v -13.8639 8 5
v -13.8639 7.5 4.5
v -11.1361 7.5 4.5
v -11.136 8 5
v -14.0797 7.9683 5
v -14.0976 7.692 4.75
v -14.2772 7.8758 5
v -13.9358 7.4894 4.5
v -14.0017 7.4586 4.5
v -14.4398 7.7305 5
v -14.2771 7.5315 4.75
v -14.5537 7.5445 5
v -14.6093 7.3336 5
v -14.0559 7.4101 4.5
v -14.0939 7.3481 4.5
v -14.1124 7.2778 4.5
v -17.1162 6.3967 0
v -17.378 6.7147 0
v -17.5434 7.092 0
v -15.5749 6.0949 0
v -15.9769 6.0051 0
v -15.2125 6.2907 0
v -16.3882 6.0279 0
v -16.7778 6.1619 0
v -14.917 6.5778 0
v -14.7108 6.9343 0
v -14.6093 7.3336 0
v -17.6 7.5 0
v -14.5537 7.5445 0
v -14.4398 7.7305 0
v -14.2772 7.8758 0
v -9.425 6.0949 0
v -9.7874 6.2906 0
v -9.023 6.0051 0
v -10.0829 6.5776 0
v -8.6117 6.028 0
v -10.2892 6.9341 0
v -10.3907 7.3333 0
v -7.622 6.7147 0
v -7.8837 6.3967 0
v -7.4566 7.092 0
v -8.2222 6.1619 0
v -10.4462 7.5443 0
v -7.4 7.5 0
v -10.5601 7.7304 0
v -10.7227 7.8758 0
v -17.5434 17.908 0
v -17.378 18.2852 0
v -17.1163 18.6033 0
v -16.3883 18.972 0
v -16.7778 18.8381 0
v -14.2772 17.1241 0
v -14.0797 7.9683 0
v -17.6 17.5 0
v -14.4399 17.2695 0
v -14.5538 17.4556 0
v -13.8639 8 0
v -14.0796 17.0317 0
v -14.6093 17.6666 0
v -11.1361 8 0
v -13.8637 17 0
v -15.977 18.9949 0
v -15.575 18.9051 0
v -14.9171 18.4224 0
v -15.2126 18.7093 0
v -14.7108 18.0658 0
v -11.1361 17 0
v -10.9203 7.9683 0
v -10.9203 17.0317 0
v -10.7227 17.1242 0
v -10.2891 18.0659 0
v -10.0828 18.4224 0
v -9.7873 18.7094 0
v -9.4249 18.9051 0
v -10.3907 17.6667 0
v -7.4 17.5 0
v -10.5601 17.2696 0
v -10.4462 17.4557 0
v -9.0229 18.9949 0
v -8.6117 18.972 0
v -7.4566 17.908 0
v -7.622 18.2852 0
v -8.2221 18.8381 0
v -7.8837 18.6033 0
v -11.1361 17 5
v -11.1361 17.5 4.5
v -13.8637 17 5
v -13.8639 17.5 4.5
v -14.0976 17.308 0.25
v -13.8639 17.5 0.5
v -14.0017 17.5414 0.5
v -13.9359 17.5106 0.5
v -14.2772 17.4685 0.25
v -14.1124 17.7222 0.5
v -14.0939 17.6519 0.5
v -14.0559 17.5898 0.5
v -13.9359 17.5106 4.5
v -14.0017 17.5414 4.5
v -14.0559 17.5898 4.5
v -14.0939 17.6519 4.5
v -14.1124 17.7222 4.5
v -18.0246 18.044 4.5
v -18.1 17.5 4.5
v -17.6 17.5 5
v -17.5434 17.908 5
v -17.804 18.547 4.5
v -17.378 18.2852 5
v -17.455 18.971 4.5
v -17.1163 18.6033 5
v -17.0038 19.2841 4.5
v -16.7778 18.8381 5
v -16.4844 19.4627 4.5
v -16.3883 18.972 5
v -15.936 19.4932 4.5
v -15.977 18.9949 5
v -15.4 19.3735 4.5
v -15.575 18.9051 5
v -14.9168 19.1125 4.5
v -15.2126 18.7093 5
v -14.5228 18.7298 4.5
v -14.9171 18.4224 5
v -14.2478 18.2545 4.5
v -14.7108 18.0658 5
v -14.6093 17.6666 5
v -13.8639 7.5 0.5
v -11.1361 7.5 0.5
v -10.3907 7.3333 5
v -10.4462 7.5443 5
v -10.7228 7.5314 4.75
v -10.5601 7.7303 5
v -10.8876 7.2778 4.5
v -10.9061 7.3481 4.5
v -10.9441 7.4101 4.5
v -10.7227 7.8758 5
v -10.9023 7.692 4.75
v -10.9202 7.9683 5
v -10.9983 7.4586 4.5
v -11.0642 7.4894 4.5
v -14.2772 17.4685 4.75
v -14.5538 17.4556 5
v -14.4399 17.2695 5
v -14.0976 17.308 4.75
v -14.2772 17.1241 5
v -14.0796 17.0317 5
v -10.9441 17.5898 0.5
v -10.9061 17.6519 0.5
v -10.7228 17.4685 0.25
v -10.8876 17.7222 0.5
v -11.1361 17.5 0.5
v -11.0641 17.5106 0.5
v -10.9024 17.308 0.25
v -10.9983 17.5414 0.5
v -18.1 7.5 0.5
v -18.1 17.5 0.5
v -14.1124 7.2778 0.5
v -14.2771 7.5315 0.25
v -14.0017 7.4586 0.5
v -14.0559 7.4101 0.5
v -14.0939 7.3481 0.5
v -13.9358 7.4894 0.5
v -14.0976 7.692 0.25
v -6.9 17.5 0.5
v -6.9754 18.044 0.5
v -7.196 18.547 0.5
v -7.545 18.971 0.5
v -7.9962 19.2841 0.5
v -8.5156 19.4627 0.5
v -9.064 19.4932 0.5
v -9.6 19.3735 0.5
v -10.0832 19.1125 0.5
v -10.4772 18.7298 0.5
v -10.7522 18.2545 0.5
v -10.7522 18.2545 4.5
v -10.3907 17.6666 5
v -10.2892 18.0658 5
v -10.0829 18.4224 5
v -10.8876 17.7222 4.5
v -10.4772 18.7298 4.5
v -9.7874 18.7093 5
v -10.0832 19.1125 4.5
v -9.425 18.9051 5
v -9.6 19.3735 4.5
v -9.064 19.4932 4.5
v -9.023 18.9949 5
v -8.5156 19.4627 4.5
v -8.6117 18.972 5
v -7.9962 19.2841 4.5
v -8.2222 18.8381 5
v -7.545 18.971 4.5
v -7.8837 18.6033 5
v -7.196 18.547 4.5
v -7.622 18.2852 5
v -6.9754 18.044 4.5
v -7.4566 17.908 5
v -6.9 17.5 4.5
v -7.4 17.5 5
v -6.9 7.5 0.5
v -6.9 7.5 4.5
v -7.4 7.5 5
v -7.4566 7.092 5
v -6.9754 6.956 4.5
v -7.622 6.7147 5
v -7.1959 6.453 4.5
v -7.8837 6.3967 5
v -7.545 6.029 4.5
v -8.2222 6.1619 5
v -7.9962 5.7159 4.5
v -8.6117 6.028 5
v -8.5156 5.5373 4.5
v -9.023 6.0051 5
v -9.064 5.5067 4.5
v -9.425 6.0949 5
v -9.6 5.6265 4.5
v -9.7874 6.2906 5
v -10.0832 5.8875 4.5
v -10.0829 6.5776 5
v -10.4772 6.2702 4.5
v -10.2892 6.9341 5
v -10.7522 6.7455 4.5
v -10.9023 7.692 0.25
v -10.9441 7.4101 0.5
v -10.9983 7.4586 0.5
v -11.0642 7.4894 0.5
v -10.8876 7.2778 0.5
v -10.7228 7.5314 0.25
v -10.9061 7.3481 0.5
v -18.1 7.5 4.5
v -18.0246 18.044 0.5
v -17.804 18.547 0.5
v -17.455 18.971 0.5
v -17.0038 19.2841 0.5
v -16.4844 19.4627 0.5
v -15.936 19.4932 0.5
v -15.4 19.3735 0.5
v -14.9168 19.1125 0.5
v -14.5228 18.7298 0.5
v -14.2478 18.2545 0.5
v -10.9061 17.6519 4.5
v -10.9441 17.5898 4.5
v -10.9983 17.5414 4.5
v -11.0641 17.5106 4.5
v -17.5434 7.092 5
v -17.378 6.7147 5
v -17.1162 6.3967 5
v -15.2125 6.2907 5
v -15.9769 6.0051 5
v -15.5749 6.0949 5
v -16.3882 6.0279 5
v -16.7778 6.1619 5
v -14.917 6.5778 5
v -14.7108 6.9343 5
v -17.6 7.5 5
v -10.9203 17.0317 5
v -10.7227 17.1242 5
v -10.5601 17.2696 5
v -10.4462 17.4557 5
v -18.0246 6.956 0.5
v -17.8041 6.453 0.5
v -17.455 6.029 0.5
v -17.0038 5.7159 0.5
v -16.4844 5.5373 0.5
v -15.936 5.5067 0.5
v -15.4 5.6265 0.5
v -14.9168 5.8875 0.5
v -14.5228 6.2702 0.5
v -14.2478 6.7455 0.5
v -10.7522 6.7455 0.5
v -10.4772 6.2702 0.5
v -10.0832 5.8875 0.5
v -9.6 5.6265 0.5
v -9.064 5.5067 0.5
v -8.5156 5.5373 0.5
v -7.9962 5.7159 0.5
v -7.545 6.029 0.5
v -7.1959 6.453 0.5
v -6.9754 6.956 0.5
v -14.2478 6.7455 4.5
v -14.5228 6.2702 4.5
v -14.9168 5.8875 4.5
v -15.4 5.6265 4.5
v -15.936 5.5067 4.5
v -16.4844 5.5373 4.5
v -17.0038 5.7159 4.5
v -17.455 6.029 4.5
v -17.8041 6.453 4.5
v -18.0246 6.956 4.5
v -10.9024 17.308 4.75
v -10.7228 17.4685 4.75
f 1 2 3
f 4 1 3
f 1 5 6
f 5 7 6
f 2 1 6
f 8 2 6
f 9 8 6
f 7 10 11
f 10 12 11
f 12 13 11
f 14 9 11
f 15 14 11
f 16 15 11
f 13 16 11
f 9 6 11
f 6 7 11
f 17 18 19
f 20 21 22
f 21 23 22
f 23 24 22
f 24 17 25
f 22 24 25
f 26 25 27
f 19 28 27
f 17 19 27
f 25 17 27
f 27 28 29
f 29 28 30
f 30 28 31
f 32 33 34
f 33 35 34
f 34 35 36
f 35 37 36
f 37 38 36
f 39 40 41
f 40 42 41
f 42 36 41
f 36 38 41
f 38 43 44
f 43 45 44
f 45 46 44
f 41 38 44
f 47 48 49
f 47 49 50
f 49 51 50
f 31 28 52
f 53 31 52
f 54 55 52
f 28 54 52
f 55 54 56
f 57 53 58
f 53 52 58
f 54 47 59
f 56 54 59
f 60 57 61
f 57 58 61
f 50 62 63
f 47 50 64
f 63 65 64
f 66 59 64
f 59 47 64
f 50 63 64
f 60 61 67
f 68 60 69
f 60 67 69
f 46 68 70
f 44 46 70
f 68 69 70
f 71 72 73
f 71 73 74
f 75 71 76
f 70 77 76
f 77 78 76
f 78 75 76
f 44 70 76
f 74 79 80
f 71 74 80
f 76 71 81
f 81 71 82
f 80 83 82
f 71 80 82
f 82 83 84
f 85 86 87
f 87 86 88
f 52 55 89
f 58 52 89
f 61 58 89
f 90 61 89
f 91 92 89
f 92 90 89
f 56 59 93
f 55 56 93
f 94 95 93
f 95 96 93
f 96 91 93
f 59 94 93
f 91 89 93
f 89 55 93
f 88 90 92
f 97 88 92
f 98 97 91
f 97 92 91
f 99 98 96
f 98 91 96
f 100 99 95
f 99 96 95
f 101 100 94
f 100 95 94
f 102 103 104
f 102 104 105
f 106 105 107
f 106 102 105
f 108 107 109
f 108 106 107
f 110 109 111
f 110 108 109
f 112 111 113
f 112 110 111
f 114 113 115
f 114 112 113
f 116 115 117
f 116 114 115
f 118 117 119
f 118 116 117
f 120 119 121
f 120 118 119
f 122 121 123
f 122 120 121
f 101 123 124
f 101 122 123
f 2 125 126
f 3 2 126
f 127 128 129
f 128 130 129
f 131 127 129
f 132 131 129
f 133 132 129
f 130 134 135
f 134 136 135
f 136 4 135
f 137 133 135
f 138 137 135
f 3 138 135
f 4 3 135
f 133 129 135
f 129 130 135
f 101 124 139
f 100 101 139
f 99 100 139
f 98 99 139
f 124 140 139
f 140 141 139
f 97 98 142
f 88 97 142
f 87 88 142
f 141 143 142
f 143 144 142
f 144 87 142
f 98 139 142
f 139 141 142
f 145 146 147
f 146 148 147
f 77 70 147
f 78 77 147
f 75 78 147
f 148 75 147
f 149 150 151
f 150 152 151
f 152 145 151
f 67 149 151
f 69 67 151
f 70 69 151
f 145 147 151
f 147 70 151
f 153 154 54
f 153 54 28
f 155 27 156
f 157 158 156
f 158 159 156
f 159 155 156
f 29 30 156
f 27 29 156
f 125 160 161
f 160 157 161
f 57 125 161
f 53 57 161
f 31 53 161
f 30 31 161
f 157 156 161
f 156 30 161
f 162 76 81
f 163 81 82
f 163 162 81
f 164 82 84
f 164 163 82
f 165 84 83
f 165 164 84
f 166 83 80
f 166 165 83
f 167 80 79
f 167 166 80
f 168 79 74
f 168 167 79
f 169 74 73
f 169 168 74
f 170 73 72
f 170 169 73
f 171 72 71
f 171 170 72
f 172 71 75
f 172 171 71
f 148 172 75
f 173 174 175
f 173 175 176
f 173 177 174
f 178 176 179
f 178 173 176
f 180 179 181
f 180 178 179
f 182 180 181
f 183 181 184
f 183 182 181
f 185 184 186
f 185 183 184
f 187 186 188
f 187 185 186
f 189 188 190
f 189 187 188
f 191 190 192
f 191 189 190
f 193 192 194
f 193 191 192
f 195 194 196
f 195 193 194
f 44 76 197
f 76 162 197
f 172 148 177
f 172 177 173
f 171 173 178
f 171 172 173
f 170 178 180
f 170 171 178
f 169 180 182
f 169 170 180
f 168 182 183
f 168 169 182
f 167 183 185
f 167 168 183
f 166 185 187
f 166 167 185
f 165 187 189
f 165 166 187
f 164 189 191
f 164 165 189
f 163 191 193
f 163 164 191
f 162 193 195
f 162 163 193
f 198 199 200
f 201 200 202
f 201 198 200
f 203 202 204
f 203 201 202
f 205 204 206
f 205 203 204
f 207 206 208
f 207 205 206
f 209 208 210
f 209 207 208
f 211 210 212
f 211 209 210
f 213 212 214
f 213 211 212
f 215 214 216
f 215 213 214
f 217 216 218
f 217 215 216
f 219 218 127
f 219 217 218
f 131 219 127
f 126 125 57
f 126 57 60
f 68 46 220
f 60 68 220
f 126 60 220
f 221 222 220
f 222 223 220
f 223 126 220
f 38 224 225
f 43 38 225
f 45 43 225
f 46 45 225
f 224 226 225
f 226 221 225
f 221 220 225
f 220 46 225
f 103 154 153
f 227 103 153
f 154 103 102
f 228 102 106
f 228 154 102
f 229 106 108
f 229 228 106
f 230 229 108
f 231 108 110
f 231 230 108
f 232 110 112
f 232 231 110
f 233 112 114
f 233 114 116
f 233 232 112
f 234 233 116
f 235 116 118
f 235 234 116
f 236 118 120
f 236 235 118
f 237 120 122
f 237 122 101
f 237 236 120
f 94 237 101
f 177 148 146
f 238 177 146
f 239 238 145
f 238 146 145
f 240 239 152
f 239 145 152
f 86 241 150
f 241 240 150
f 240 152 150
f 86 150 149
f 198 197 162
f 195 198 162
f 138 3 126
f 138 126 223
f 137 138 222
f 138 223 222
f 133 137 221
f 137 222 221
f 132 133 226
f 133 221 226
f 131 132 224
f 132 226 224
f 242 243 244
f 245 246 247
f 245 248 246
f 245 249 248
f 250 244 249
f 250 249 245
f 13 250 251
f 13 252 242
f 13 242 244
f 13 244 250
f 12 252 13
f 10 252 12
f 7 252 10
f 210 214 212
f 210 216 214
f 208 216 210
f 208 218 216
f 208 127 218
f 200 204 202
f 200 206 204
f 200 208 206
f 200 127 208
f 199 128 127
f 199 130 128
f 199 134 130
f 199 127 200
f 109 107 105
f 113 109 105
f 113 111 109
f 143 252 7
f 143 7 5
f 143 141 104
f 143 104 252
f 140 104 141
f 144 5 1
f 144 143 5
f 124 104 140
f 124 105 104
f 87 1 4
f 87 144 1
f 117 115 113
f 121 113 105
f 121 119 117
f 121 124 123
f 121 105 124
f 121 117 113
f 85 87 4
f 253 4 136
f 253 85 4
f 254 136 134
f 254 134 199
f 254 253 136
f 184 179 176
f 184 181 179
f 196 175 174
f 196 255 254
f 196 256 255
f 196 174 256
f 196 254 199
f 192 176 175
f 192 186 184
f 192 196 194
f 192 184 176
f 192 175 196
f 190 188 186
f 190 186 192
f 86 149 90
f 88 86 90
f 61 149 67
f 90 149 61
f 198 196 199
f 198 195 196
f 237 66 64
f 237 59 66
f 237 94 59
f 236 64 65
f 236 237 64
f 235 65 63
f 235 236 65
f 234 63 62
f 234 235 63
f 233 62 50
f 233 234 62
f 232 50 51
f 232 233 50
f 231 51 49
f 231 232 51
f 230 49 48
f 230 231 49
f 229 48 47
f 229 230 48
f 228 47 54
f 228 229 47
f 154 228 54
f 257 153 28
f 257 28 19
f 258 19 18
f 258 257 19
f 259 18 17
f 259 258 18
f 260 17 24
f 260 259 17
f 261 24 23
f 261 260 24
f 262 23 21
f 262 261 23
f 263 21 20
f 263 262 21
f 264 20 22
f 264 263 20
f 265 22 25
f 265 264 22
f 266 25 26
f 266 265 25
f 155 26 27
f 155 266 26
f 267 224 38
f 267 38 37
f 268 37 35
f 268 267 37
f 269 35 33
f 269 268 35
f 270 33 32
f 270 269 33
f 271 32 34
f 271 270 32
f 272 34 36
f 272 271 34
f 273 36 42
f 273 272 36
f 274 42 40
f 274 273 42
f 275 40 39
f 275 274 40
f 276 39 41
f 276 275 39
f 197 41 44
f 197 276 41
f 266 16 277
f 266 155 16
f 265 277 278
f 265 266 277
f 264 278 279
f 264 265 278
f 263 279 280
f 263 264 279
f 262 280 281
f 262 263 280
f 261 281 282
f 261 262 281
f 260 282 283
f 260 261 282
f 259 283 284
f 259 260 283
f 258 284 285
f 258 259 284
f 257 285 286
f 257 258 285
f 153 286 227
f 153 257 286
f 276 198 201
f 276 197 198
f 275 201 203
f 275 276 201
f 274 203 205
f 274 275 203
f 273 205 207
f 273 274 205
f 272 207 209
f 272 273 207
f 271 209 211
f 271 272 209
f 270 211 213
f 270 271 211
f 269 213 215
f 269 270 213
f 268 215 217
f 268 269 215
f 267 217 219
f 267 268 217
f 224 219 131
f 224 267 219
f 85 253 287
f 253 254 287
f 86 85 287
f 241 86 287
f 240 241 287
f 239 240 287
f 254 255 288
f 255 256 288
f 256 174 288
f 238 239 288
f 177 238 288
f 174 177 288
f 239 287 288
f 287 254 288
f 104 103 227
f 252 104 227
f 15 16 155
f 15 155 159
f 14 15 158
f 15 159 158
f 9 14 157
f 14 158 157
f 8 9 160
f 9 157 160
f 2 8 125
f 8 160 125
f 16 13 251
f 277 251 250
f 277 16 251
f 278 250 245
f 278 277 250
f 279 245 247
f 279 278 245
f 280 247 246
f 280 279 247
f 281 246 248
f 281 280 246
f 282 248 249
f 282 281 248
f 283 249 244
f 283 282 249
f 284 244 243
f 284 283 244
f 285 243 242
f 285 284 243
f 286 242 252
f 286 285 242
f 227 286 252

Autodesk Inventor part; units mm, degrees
ref_plane "YZ Plane" through (0, 0, 0) normal (1, 0, 0) x (0, 1, 0)
ref_plane "XZ Plane" through (0, 0, 0) normal (0, 1, 0) x (-1, 0, 0)
ref_plane "XY Plane" through (0, 0, 0) normal (0, 0, 1) x (1, 0, 0)
ref_plane "Arbeitsebene1" through (0, 0, 0) normal (0, 0, 1) x (1, 0, 0)
sketch "Skizze1" plane through (0, 0, 0) normal (0, 0, 1) x (1, 0, 0)
  line L0 (-2.5, -5) -> (27.5, -5) projected
  arc A0 (-5, -2.5) -> (-2.5, -5) centre (-2.5, -2.5) ccw projected
  line L1 (-5, 27.5) -> (-5, -2.5) projected
  arc A1 (-2.5, 30) -> (-5, 27.5) centre (-2.5, 27.5) ccw projected
  line L2 (27.5, 30) -> (-2.5, 30) projected
  arc A2 (30, 27.5) -> (27.5, 30) centre (27.5, 27.5) ccw projected
  line L3 (30, -2.5) -> (30, 27.5) projected
  arc A3 (27.5, -5) -> (30, -2.5) centre (27.5, -2.5) ccw projected
  circle A4 centre (12.5, -9.5) radius 4 projected
  line L4 (30.75, 28.4722) -> (33.3, 29.9445) projected
  line L5 (33.3, 29.9445) -> (35.85, 28.4722) projected
  line L6 (35.85, 28.4722) -> (35.85, 25.5278) projected
  line L7 (35.85, 25.5278) -> (33.3, 24.0555) projected
  line L8 (33.3, 24.0555) -> (30.75, 25.5278) projected
  line L9 (30.75, 25.5278) -> (30.75, 28.4722) projected
  line L10 (25.5278, 30.75) -> (24.0555, 33.3) projected
  line L11 (24.0555, 33.3) -> (25.5278, 35.85) projected
  line L12 (25.5278, 35.85) -> (28.4722, 35.85) projected
  line L13 (28.4722, 35.85) -> (29.9445, 33.3) projected
  line L14 (29.9445, 33.3) -> (28.4722, 30.75) projected
  line L15 (28.4722, 30.75) -> (25.5278, 30.75) projected
  line L16 (30.75, -3.4722) -> (33.3, -4.9445) projected
  line L17 (30.75, -0.5278) -> (30.75, -3.4722) projected
  line L18 (33.3, 0.9445) -> (30.75, -0.5278) projected
  line L19 (35.85, -0.5278) -> (33.3, 0.9445) projected
  line L20 (35.85, -3.4722) -> (35.85, -0.5278) projected
  line L21 (33.3, -4.9445) -> (35.85, -3.4722) projected
  line L22 (25.5278, -5.75) -> (24.0555, -8.3) projected
  line L23 (28.4722, -5.75) -> (25.5278, -5.75) projected
  line L24 (29.9445, -8.3) -> (28.4722, -5.75) projected
  line L25 (28.4722, -10.85) -> (29.9445, -8.3) projected
  line L26 (25.5278, -10.85) -> (28.4722, -10.85) projected
  line L27 (24.0555, -8.3) -> (25.5278, -10.85) projected
  line L28 (-5.75, 28.4722) -> (-8.3, 29.9445) projected
  line L29 (-5.75, 25.5278) -> (-5.75, 28.4722) projected
  line L30 (-8.3, 24.0555) -> (-5.75, 25.5278) projected
  line L31 (-10.85, 25.5278) -> (-8.3, 24.0555) projected
  line L32 (-10.85, 28.4722) -> (-10.85, 25.5278) projected
  line L33 (-8.3, 29.9445) -> (-10.85, 28.4722) projected
  line L34 (-0.5278, 30.75) -> (0.9445, 33.3) projected
  line L35 (-3.4722, 30.75) -> (-0.5278, 30.75) projected
  line L36 (-4.9445, 33.3) -> (-3.4722, 30.75) projected
  line L37 (-3.4722, 35.85) -> (-4.9445, 33.3) projected
  line L38 (-0.5278, 35.85) -> (-3.4722, 35.85) projected
  line L39 (0.9445, 33.3) -> (-0.5278, 35.85) projected
  line L40 (-0.5278, -5.75) -> (0.9445, -8.3) projected
  line L41 (0.9445, -8.3) -> (-0.5278, -10.85) projected
  line L42 (-0.5278, -10.85) -> (-3.4722, -10.85) projected
  line L43 (-3.4722, -10.85) -> (-4.9445, -8.3) projected
  line L44 (-4.9445, -8.3) -> (-3.4722, -5.75) projected
  line L45 (-3.4722, -5.75) -> (-0.5278, -5.75) projected
  line L46 (-5.75, -3.4722) -> (-8.3, -4.9445) projected
  line L47 (-8.3, -4.9445) -> (-10.85, -3.4722) projected
  line L48 (-10.85, -3.4722) -> (-10.85, -0.5278) projected
  line L49 (-10.85, -0.5278) -> (-8.3, 0.9445) projected
  line L50 (-8.3, 0.9445) -> (-5.75, -0.5278) projected
  line L51 (-5.75, -0.5278) -> (-5.75, -3.4722) projected
  circle A5 centre (-9.5, 12.5) radius 4 projected
  line L52 (36.5833, 6.6002) -> (37, 6.6003) projected
  arc A6 (31.3, 7.45) -> (36.5833, 6.6002) centre (34.01, 7.45) ccw projected
  line L53 (31.3, 17.55) -> (31.3, 7.45) projected
  arc A7 (36.5833, 18.3998) -> (31.3, 17.55) centre (34.01, 17.55) ccw projected
  line L54 (37, 18.3997) -> (36.5833, 18.3998) projected
  line L55 (37, 35.5) -> (37, 18.3997) projected
  arc A8 (37, 35.5) -> (35.5, 37) centre (35.5, 35.5) ccw projected
  line L56 (18.3997, 37) -> (35.5, 37) projected
  line L57 (18.3998, 36.5833) -> (18.3997, 37) projected
  arc A9 (17.55, 31.3) -> (18.3998, 36.5833) centre (17.55, 34.01) ccw projected
  line L58 (7.45, 31.3) -> (17.55, 31.3) projected
  arc A10 (6.6002, 36.5833) -> (7.45, 31.3) centre (7.45, 34.01) ccw projected
  line L59 (6.6003, 37) -> (6.6002, 36.5833) projected
  line L60 (-10.5, 37) -> (6.6003, 37) projected
  arc A11 (-10.5, 37) -> (-12, 35.5) centre (-10.5, 35.5) ccw projected
  line L61 (-12, 17) -> (-12, 35.5) projected
  line L62 (-13.8639, 17) -> (-12, 17) projected
  arc A12 (-14.6093, 17.6667) -> (-13.8639, 17) centre (-13.8639, 17.75) ccw projected
  arc A13 (-14.6093, 17.6667) -> (-17.6, 17.5) centre (-16.1, 17.5) ccw projected
  line L63 (-17.6, 7.5) -> (-17.6, 17.5) projected
  arc A14 (-17.6, 7.5) -> (-14.6093, 7.3333) centre (-16.1, 7.5) ccw projected
  arc A15 (-13.8639, 8) -> (-14.6093, 7.3333) centre (-13.8639, 7.25) ccw projected
  line L64 (-12, 8) -> (-13.8639, 8) projected
  line L65 (-12, -10.5) -> (-12, 8) projected
  arc A16 (-12, -10.5) -> (-10.5, -12) centre (-10.5, -10.5) ccw projected
  line L66 (8, -12) -> (-10.5, -12) projected
  line L67 (8, -13.8639) -> (8, -12) projected
  arc A17 (7.3333, -14.6093) -> (8, -13.8639) centre (7.25, -13.8639) ccw projected
  arc A18 (7.3333, -14.6093) -> (7.5, -17.6) centre (7.5, -16.1) ccw projected
  line L68 (17.5, -17.6) -> (7.5, -17.6) projected
  arc A19 (17.5, -17.6) -> (17.6667, -14.6093) centre (17.5, -16.1) ccw projected
  arc A20 (17, -13.8639) -> (17.6667, -14.6093) centre (17.75, -13.8639) ccw projected
  line L69 (17, -12) -> (17, -13.8639) projected
  line L70 (35.5, -12) -> (17, -12) projected
  arc A21 (35.5, -12) -> (37, -10.5) centre (35.5, -10.5) ccw projected
  line L71 (37, 6.6003) -> (37, -10.5) projected
  arc A22 (-18.1, 7.5) -> (-14.1124, 7.2778) centre (-16.1, 7.5) ccw projected
  arc A23 (-13.8639, 7.5) -> (-14.1124, 7.2778) centre (-13.8639, 7.25) ccw projected
  line L72 (-18.1, 17.5) -> (-18.1, 7.5) projected
  line L73 (-12, 8) -> (-13.8639, 8) projected
  line L74 (-13.8639, 7.5) -> (-13.8639, 8) projected
  line L75 (-13.8639, 7.5) -> (-12.5, 7.5) projected
  line L76 (-12, 8) -> (-12.5, 7.5) projected
  arc A24 (-14.1124, 17.7222) -> (-18.1, 17.5) centre (-16.1, 17.5) ccw projected
  line L77 (-12.5, 17.5) -> (-13.8639, 17.5) projected
  arc A25 (-14.1124, 17.7222) -> (-13.8639, 17.5) centre (-13.8639, 17.75) ccw projected
  line L78 (-12.5, 17.5) -> (-12.5, 7.5)
  point P0 (0, 0)
extrude "Extrusion1" add sketch "Skizze1" along normal blind 5 contours L78 A5 | A5 L78 L64 A15 A14 L63 A13 A12 L62 | L62 A12 A13 L63 A14 A15 L74 A23 A22 L72 A24 A25 L77 L78 | L78 L75 L74 L64 picked at (-12.6815, 11.8821)
mirror "Spiegeln1" about plane through (-12.5, 7.5, 0) normal (1, 0, 0) of "Extrusion1"
chamfer "Fase1" distance 0.5 angle 45 24 edges at (-8.7887, 19.4969, 5) (-6.9, 12.5, 5) (-8.7887, 5.5031, 5) (-10.9694, 7.4363, 5) (-12.5, 7.5, 5) (-14.0306, 7.4363, 5) (-16.2113, 5.5031, 5) (-18.1, 12.5, 5) (-16.2113, 19.4969, 5) (-14.0306, 17.5637, 5) (-12.5, 17.5, 5) (-10.9694, 17.5637, 5) (-12.5, 7.5, 0) (-10.9694, 7.4363, 0) (-8.7887, 5.5031, 0) (-6.9, 12.5, 0) (-8.7887, 19.4969, 0) (-10.9694, 17.5637, 0) (-12.5, 17.5, 0) (-14.0306, 17.5637, 0) (-16.2113, 19.4969, 0) (-18.1, 12.5, 0) (-16.2113, 5.5031, 0) (-14.0306, 7.4363, 0)
properties part number "10_Base_puzzle_nozzle_male_male"
